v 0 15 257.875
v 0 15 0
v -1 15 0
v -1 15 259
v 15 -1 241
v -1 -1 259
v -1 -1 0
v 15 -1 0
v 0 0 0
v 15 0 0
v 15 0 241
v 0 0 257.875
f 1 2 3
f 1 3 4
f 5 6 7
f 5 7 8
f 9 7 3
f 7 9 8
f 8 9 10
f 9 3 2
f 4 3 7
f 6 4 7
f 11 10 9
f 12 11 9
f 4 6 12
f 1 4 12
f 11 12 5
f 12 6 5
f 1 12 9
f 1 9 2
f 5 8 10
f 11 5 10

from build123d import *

# Parameters (mm, degrees)
EXTRUDE_THIN1_DEPTH = 259
CUT_EXTRUDE1_DEPTH  = 260.926912804


with BuildPart() as part:
    # Sketch1 → Extrude-Thin1 (new body)
    with BuildSketch(Plane.XY):
        Polygon((15, 0), (0, 0), (0, 15), (-1, 15), (-1, -1), (15, -1), align=None)
    extrude(amount=EXTRUDE_THIN1_DEPTH)

    # Sketch2 → Cut-Extrude1 (cut, through all)
    with BuildSketch(Plane(origin=(0, -1, 0), x_dir=(-1, 0, 0), z_dir=(0, -1, 0))):
        Polygon((1, -259), (-15, -241), (-15, -259), align=None)
    extrude(amount=-CUT_EXTRUDE1_DEPTH, mode=Mode.SUBTRACT)


solid = part.part
